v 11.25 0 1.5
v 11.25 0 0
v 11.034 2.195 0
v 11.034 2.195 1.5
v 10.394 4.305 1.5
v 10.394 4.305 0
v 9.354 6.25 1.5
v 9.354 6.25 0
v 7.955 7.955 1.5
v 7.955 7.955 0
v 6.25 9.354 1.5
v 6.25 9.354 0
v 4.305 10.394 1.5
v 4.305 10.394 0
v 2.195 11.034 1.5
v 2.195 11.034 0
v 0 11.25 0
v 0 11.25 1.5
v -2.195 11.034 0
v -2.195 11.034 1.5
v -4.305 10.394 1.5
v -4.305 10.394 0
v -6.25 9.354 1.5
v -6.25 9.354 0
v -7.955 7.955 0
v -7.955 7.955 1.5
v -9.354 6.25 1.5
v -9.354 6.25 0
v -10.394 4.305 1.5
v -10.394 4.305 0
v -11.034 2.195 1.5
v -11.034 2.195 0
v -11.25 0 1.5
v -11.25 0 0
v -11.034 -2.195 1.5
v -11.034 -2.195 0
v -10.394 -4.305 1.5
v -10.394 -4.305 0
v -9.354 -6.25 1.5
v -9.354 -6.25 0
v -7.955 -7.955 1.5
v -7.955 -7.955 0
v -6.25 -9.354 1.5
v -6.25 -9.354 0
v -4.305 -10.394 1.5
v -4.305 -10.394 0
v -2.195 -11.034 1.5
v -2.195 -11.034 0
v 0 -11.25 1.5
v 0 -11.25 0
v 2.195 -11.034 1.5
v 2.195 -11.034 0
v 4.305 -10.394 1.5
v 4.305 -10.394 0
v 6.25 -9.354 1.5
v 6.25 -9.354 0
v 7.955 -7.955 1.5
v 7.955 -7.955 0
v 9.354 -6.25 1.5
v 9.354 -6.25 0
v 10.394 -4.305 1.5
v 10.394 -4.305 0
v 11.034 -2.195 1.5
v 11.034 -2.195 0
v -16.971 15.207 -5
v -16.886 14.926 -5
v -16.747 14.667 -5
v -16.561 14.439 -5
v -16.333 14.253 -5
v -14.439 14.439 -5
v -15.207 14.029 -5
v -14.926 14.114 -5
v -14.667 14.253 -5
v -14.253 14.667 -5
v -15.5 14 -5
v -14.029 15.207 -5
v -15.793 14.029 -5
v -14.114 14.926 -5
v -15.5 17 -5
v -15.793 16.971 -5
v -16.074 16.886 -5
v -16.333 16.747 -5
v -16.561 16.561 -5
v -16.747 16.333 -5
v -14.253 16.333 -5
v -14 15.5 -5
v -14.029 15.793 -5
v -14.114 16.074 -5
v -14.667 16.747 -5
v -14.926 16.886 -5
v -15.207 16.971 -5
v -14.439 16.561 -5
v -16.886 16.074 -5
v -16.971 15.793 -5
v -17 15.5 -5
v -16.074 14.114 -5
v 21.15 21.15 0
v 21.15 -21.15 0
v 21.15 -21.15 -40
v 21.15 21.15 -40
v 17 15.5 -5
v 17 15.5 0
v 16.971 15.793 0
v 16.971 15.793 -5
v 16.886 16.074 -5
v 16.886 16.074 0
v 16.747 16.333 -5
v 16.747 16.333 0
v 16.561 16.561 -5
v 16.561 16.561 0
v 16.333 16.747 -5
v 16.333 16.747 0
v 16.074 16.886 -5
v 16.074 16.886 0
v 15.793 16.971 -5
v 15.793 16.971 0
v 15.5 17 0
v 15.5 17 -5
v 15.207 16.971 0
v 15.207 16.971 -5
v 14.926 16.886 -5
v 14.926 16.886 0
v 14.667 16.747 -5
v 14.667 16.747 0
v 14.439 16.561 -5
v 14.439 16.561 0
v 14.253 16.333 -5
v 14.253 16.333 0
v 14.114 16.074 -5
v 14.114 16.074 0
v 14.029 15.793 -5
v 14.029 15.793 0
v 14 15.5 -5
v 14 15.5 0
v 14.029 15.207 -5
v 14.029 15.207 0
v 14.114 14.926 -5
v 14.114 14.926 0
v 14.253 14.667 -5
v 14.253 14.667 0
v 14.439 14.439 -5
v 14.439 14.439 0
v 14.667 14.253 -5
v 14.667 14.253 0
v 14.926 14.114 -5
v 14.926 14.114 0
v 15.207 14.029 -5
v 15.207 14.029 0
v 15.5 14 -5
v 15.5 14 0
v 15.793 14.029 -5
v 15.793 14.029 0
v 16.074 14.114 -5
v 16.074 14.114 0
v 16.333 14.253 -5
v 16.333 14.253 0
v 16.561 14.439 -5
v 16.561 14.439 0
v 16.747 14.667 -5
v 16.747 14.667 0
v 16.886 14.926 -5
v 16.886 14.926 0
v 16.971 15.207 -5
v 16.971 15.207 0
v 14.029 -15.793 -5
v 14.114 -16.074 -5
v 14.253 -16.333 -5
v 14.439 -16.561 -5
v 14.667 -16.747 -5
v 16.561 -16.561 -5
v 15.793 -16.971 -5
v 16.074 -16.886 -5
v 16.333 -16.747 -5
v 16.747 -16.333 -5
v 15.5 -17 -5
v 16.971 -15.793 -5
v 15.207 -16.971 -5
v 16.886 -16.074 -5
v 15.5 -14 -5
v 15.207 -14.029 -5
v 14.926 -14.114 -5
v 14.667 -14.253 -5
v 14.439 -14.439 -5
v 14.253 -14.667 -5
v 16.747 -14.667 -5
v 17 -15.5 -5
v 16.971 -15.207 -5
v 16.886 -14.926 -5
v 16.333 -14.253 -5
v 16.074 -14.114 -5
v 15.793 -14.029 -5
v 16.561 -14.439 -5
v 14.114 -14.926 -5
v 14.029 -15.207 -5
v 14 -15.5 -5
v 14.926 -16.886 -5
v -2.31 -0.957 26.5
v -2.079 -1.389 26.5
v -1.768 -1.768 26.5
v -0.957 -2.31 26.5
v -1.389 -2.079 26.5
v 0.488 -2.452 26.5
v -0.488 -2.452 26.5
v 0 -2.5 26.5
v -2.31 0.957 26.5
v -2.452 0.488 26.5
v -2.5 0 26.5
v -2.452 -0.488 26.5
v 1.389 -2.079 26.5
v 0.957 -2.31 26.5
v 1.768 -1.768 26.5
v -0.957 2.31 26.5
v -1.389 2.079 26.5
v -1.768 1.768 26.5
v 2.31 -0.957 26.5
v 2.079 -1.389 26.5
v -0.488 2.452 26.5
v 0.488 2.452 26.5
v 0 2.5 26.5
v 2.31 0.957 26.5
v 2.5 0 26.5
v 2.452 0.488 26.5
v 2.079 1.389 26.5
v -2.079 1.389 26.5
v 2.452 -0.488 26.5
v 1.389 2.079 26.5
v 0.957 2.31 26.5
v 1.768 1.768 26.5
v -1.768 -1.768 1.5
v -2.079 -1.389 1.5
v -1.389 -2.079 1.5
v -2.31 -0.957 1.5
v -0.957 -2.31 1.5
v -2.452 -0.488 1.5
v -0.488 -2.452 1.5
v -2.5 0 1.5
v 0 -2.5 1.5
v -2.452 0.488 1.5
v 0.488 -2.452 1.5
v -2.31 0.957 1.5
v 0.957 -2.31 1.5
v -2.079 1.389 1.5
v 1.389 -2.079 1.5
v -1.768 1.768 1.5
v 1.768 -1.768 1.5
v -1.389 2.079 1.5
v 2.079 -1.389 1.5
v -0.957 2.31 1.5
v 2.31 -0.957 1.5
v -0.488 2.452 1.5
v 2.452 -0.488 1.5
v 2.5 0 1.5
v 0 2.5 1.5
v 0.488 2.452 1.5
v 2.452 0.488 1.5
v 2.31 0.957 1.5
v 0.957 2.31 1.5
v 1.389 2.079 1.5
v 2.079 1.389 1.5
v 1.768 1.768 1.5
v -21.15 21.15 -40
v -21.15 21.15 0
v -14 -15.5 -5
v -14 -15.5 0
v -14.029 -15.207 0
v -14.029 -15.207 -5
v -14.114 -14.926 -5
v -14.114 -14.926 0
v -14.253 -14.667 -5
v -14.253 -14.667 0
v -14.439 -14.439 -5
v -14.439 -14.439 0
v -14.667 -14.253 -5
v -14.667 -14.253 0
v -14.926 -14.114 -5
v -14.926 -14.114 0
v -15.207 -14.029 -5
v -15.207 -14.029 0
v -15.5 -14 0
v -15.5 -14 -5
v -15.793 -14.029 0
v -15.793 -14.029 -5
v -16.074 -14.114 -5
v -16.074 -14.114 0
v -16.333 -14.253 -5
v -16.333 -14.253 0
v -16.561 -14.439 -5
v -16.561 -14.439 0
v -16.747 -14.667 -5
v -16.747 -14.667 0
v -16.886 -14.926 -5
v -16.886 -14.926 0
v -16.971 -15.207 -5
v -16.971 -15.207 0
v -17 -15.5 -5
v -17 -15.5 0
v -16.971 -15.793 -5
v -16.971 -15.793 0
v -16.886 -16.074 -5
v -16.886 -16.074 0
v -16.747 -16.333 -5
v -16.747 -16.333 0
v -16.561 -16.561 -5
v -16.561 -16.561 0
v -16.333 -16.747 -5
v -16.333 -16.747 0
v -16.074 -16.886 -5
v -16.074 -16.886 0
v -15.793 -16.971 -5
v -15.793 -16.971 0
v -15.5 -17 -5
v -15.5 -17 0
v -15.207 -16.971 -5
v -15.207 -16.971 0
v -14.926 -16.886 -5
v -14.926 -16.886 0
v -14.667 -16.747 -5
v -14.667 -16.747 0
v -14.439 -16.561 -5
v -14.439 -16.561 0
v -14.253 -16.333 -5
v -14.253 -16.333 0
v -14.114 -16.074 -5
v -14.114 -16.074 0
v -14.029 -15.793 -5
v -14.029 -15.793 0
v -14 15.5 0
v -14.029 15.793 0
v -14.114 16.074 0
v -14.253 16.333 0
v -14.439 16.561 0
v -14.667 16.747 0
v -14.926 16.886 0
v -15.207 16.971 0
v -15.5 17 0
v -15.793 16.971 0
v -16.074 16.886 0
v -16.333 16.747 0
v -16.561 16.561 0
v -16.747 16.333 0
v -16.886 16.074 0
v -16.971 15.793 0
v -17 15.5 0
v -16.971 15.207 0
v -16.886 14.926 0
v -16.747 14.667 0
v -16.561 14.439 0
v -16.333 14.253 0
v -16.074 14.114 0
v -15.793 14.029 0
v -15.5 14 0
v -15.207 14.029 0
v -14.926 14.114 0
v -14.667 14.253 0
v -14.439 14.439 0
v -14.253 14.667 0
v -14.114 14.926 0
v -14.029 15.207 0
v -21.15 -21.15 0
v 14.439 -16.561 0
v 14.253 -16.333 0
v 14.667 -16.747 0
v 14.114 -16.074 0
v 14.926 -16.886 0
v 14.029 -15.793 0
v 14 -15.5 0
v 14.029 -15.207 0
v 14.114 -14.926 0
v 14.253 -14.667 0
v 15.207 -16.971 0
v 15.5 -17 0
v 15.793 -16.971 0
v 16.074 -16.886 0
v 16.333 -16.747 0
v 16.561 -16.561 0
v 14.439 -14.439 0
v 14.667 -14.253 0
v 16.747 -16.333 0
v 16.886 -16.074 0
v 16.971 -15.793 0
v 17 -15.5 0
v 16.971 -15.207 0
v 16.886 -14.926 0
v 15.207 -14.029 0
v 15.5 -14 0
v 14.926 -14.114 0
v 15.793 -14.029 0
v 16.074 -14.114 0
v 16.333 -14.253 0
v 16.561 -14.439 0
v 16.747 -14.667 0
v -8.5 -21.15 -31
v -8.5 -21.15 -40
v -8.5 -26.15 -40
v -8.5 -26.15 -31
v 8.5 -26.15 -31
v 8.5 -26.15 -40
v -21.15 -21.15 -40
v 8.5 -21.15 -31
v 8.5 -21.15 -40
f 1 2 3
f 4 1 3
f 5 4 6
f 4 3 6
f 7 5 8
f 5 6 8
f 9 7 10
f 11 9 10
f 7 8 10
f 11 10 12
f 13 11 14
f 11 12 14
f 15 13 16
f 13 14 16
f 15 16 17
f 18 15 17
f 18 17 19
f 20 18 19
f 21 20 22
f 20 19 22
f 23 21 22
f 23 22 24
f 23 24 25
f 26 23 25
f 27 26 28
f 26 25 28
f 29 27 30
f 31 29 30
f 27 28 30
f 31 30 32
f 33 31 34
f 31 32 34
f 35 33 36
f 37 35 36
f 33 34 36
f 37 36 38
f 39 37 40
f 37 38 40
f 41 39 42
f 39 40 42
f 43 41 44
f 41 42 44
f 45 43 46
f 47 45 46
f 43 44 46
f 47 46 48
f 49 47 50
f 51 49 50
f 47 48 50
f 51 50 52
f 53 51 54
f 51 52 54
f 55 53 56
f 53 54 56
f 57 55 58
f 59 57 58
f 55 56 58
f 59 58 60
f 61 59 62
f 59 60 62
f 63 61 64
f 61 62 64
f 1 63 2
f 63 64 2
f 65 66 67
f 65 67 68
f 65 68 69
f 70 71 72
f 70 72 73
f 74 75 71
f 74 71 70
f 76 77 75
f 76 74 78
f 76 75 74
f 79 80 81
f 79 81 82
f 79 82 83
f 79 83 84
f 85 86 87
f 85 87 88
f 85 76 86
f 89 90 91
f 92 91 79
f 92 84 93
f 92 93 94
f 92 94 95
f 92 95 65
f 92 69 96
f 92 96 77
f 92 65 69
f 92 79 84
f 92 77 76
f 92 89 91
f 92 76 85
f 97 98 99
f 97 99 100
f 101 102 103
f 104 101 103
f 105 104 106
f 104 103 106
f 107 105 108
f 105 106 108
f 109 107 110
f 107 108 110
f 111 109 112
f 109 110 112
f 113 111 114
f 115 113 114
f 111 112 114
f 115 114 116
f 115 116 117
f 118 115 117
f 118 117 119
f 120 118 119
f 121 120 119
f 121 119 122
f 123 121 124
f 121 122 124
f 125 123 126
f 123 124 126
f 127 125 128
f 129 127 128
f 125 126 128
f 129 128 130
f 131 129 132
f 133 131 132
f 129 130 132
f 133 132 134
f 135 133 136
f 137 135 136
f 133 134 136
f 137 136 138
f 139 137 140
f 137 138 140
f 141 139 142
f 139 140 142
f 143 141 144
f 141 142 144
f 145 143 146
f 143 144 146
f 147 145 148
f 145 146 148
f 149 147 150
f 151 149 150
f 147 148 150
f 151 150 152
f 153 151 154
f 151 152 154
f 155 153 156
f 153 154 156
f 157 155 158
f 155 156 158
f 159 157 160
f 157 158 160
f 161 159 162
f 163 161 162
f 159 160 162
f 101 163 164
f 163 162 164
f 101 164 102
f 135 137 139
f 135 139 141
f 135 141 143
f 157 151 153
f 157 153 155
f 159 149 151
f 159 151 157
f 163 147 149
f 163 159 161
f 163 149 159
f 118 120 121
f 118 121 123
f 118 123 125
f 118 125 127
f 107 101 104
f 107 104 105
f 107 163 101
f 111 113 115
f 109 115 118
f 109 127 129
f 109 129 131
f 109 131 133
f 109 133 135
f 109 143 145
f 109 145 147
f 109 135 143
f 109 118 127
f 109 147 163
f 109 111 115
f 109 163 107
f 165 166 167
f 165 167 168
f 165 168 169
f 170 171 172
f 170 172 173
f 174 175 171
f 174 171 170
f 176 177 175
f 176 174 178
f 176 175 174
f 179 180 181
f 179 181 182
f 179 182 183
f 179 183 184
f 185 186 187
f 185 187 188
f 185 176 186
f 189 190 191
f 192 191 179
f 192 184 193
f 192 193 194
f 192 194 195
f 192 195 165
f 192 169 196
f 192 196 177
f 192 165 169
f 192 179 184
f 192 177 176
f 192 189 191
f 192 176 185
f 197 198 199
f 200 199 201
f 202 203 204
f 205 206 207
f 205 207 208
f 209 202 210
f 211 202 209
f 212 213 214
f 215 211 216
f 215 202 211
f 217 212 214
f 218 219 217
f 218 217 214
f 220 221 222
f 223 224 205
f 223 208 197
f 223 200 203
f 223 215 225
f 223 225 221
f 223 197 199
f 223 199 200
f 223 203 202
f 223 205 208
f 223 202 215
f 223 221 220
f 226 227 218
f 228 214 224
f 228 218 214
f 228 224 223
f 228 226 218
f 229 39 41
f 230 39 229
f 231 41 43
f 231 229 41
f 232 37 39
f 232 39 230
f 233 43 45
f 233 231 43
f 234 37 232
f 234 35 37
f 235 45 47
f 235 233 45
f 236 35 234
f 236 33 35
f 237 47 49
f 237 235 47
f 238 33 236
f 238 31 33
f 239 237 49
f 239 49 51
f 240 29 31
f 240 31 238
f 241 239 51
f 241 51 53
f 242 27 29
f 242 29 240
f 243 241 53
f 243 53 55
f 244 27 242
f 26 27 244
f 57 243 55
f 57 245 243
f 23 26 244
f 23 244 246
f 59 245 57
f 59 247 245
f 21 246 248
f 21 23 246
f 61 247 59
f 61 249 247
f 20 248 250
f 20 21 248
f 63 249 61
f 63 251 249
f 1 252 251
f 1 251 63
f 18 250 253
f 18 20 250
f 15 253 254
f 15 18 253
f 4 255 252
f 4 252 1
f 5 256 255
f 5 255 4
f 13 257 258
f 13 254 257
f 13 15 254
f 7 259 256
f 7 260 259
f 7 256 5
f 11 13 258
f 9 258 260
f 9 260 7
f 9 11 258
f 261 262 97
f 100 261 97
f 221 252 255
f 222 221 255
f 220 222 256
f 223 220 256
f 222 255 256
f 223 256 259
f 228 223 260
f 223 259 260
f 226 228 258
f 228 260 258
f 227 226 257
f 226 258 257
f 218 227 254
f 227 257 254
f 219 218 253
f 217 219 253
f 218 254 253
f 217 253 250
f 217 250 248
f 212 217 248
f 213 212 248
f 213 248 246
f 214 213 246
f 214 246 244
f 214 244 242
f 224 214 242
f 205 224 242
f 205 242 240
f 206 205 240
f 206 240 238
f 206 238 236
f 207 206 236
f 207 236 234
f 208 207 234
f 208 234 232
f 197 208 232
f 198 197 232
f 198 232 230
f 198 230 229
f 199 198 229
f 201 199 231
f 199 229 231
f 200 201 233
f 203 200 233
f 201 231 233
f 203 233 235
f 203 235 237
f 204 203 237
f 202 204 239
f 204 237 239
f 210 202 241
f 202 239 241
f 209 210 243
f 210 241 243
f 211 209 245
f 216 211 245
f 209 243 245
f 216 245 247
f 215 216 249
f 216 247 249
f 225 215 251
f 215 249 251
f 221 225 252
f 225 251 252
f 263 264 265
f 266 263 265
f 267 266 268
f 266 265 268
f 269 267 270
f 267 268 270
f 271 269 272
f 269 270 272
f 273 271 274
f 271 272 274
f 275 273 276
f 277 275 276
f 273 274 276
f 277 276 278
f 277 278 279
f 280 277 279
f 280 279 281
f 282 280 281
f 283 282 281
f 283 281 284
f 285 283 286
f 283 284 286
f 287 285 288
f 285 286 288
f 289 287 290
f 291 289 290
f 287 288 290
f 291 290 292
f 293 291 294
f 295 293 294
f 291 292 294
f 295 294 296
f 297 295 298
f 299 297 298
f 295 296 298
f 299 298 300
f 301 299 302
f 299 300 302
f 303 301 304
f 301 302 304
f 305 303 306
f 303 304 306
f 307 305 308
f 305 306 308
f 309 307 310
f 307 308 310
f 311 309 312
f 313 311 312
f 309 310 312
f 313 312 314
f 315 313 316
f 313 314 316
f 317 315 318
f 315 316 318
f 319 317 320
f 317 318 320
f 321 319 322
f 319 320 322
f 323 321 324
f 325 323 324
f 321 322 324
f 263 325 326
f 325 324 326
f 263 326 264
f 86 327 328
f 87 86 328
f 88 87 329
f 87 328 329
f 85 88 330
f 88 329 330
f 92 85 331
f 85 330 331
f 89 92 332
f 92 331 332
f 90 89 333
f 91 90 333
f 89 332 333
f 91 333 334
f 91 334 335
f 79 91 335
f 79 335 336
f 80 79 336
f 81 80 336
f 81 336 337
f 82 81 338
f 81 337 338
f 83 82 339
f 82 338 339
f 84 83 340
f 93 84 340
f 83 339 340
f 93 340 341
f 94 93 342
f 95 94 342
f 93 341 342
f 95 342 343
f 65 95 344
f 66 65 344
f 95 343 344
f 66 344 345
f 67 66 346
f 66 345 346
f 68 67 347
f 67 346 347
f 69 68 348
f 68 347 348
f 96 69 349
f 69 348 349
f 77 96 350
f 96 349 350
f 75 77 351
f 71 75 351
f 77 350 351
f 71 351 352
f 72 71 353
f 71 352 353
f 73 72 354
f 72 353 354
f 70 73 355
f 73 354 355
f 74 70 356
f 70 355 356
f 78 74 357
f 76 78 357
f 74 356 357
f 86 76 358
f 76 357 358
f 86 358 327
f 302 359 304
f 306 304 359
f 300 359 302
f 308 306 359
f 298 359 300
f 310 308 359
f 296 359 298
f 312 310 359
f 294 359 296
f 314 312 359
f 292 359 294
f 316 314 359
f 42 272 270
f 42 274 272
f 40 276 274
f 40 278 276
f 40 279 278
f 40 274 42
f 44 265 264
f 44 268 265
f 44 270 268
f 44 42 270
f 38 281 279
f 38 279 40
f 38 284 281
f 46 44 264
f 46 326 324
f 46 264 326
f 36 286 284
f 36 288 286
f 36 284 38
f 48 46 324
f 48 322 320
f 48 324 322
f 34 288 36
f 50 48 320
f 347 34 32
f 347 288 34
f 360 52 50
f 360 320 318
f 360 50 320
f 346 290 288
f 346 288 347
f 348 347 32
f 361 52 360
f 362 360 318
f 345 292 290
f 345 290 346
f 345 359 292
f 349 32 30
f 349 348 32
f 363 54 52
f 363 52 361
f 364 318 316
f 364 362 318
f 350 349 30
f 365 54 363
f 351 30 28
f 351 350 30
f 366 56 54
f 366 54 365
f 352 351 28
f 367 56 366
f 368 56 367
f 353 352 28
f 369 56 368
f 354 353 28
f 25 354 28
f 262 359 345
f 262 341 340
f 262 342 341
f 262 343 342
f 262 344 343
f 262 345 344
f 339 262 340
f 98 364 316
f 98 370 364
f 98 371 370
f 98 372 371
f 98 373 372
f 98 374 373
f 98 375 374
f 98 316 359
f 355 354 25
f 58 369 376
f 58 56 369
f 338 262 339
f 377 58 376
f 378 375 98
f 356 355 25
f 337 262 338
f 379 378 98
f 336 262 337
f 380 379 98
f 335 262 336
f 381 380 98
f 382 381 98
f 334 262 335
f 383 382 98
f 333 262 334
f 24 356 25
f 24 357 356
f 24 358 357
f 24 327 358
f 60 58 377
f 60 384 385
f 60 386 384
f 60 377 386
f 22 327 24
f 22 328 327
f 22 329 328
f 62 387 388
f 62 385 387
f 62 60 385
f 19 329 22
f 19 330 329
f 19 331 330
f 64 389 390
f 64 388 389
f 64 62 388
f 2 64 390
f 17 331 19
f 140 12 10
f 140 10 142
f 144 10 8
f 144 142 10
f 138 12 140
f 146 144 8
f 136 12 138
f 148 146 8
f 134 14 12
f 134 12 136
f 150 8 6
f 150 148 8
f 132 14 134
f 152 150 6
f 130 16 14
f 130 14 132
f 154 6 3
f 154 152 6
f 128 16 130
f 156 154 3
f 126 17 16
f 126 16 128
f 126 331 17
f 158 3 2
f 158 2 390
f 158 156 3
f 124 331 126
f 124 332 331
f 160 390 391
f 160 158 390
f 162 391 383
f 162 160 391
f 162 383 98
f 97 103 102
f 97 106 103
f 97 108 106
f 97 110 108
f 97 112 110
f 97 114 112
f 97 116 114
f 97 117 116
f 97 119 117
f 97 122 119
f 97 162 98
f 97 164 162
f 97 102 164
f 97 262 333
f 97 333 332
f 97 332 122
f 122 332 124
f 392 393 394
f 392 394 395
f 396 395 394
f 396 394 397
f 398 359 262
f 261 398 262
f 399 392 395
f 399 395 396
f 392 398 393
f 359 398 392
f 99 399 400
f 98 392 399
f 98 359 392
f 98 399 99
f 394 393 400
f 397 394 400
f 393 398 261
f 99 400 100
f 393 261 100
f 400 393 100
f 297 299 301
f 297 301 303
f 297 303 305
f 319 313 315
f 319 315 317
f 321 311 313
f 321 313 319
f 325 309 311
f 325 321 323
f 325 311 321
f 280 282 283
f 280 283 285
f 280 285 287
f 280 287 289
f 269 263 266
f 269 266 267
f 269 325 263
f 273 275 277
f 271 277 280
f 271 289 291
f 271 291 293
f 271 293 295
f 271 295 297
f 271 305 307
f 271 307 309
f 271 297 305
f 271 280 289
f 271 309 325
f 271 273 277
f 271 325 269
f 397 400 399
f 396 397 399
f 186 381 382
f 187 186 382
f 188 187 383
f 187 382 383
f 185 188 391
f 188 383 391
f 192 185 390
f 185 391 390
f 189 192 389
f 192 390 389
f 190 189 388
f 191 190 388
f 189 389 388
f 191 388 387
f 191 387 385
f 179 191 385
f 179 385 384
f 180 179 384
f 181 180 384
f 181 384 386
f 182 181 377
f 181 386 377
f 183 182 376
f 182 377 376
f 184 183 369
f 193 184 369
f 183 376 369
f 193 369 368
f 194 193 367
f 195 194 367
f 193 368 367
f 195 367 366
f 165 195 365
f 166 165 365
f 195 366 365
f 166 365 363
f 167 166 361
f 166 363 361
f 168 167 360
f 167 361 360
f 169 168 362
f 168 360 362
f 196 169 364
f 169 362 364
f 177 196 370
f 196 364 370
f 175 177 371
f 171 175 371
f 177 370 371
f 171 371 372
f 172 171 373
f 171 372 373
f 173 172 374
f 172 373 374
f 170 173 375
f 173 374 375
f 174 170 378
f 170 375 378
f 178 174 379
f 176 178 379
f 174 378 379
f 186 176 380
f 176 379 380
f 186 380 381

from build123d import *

# Parameters (mm, degrees)
SKETCH1_W                = 42.3
SKETCH1_H                = 42.3
BOSS_EXTRUDE1_DEPTH      = 40
SKETCH1_3_R              = 1.5
CUT_EXTRUDE1_DEPTH       = 5
SKETCH1_4_R              = 11.25
SKETCH1_4_R_2            = 2.5
BOSS_EXTRUDE2_DEPTH      = 1.5
BOSS_EXTRUDE3_DEPTH      = 25
BOSS_EXTRUDE3_DEPTH_BACK = 40
BOSS_EXTRUDE3_START      = 1.5
SKETCH1_5_R              = 2.5
SKETCH3_W                = 17
SKETCH3_H                = 9
BOSS_EXTRUDE4_DEPTH      = 5


with BuildPart() as part:
    # Sketch1 → Boss-Extrude1 (new body)
    with BuildSketch(Plane.XY):
        Rectangle(SKETCH1_W, SKETCH1_H)
    extrude(amount=-BOSS_EXTRUDE1_DEPTH)

    # Sketch1<3> → Cut-Extrude1 (cut)
    with BuildSketch(Plane.XY):
        with Locations((-15.5, -15.5)):
            Circle(SKETCH1_3_R)
        with Locations((15.5, 15.5)):
            Circle(SKETCH1_3_R)
        with Locations((15.5, -15.5)):
            Circle(SKETCH1_3_R)
        with Locations((-15.5, 15.5)):
            Circle(SKETCH1_3_R)
    extrude(amount=-CUT_EXTRUDE1_DEPTH, mode=Mode.SUBTRACT)

    # Sketch1<4> → Boss-Extrude2 (add)
    with BuildSketch(Plane.XY):
        Circle(SKETCH1_4_R)
        Circle(SKETCH1_4_R_2, mode=Mode.SUBTRACT)
    extrude(amount=BOSS_EXTRUDE2_DEPTH)

    # Sketch1<5> → Boss-Extrude3 (add, two sides: drawn at the far end of the back side and taken through both)
    with BuildSketch(Plane.XY.offset(BOSS_EXTRUDE3_START - BOSS_EXTRUDE3_DEPTH_BACK)):
        Circle(SKETCH1_5_R)
    extrude(amount=BOSS_EXTRUDE3_DEPTH + BOSS_EXTRUDE3_DEPTH_BACK)

    # Sketch3 → Boss-Extrude4 (add)
    with BuildSketch(Plane.XZ.offset(21.15)):
        with Locations((0, -35.5)):
            Rectangle(SKETCH3_W, SKETCH3_H)
    extrude(amount=BOSS_EXTRUDE4_DEPTH)


solid = part.part
